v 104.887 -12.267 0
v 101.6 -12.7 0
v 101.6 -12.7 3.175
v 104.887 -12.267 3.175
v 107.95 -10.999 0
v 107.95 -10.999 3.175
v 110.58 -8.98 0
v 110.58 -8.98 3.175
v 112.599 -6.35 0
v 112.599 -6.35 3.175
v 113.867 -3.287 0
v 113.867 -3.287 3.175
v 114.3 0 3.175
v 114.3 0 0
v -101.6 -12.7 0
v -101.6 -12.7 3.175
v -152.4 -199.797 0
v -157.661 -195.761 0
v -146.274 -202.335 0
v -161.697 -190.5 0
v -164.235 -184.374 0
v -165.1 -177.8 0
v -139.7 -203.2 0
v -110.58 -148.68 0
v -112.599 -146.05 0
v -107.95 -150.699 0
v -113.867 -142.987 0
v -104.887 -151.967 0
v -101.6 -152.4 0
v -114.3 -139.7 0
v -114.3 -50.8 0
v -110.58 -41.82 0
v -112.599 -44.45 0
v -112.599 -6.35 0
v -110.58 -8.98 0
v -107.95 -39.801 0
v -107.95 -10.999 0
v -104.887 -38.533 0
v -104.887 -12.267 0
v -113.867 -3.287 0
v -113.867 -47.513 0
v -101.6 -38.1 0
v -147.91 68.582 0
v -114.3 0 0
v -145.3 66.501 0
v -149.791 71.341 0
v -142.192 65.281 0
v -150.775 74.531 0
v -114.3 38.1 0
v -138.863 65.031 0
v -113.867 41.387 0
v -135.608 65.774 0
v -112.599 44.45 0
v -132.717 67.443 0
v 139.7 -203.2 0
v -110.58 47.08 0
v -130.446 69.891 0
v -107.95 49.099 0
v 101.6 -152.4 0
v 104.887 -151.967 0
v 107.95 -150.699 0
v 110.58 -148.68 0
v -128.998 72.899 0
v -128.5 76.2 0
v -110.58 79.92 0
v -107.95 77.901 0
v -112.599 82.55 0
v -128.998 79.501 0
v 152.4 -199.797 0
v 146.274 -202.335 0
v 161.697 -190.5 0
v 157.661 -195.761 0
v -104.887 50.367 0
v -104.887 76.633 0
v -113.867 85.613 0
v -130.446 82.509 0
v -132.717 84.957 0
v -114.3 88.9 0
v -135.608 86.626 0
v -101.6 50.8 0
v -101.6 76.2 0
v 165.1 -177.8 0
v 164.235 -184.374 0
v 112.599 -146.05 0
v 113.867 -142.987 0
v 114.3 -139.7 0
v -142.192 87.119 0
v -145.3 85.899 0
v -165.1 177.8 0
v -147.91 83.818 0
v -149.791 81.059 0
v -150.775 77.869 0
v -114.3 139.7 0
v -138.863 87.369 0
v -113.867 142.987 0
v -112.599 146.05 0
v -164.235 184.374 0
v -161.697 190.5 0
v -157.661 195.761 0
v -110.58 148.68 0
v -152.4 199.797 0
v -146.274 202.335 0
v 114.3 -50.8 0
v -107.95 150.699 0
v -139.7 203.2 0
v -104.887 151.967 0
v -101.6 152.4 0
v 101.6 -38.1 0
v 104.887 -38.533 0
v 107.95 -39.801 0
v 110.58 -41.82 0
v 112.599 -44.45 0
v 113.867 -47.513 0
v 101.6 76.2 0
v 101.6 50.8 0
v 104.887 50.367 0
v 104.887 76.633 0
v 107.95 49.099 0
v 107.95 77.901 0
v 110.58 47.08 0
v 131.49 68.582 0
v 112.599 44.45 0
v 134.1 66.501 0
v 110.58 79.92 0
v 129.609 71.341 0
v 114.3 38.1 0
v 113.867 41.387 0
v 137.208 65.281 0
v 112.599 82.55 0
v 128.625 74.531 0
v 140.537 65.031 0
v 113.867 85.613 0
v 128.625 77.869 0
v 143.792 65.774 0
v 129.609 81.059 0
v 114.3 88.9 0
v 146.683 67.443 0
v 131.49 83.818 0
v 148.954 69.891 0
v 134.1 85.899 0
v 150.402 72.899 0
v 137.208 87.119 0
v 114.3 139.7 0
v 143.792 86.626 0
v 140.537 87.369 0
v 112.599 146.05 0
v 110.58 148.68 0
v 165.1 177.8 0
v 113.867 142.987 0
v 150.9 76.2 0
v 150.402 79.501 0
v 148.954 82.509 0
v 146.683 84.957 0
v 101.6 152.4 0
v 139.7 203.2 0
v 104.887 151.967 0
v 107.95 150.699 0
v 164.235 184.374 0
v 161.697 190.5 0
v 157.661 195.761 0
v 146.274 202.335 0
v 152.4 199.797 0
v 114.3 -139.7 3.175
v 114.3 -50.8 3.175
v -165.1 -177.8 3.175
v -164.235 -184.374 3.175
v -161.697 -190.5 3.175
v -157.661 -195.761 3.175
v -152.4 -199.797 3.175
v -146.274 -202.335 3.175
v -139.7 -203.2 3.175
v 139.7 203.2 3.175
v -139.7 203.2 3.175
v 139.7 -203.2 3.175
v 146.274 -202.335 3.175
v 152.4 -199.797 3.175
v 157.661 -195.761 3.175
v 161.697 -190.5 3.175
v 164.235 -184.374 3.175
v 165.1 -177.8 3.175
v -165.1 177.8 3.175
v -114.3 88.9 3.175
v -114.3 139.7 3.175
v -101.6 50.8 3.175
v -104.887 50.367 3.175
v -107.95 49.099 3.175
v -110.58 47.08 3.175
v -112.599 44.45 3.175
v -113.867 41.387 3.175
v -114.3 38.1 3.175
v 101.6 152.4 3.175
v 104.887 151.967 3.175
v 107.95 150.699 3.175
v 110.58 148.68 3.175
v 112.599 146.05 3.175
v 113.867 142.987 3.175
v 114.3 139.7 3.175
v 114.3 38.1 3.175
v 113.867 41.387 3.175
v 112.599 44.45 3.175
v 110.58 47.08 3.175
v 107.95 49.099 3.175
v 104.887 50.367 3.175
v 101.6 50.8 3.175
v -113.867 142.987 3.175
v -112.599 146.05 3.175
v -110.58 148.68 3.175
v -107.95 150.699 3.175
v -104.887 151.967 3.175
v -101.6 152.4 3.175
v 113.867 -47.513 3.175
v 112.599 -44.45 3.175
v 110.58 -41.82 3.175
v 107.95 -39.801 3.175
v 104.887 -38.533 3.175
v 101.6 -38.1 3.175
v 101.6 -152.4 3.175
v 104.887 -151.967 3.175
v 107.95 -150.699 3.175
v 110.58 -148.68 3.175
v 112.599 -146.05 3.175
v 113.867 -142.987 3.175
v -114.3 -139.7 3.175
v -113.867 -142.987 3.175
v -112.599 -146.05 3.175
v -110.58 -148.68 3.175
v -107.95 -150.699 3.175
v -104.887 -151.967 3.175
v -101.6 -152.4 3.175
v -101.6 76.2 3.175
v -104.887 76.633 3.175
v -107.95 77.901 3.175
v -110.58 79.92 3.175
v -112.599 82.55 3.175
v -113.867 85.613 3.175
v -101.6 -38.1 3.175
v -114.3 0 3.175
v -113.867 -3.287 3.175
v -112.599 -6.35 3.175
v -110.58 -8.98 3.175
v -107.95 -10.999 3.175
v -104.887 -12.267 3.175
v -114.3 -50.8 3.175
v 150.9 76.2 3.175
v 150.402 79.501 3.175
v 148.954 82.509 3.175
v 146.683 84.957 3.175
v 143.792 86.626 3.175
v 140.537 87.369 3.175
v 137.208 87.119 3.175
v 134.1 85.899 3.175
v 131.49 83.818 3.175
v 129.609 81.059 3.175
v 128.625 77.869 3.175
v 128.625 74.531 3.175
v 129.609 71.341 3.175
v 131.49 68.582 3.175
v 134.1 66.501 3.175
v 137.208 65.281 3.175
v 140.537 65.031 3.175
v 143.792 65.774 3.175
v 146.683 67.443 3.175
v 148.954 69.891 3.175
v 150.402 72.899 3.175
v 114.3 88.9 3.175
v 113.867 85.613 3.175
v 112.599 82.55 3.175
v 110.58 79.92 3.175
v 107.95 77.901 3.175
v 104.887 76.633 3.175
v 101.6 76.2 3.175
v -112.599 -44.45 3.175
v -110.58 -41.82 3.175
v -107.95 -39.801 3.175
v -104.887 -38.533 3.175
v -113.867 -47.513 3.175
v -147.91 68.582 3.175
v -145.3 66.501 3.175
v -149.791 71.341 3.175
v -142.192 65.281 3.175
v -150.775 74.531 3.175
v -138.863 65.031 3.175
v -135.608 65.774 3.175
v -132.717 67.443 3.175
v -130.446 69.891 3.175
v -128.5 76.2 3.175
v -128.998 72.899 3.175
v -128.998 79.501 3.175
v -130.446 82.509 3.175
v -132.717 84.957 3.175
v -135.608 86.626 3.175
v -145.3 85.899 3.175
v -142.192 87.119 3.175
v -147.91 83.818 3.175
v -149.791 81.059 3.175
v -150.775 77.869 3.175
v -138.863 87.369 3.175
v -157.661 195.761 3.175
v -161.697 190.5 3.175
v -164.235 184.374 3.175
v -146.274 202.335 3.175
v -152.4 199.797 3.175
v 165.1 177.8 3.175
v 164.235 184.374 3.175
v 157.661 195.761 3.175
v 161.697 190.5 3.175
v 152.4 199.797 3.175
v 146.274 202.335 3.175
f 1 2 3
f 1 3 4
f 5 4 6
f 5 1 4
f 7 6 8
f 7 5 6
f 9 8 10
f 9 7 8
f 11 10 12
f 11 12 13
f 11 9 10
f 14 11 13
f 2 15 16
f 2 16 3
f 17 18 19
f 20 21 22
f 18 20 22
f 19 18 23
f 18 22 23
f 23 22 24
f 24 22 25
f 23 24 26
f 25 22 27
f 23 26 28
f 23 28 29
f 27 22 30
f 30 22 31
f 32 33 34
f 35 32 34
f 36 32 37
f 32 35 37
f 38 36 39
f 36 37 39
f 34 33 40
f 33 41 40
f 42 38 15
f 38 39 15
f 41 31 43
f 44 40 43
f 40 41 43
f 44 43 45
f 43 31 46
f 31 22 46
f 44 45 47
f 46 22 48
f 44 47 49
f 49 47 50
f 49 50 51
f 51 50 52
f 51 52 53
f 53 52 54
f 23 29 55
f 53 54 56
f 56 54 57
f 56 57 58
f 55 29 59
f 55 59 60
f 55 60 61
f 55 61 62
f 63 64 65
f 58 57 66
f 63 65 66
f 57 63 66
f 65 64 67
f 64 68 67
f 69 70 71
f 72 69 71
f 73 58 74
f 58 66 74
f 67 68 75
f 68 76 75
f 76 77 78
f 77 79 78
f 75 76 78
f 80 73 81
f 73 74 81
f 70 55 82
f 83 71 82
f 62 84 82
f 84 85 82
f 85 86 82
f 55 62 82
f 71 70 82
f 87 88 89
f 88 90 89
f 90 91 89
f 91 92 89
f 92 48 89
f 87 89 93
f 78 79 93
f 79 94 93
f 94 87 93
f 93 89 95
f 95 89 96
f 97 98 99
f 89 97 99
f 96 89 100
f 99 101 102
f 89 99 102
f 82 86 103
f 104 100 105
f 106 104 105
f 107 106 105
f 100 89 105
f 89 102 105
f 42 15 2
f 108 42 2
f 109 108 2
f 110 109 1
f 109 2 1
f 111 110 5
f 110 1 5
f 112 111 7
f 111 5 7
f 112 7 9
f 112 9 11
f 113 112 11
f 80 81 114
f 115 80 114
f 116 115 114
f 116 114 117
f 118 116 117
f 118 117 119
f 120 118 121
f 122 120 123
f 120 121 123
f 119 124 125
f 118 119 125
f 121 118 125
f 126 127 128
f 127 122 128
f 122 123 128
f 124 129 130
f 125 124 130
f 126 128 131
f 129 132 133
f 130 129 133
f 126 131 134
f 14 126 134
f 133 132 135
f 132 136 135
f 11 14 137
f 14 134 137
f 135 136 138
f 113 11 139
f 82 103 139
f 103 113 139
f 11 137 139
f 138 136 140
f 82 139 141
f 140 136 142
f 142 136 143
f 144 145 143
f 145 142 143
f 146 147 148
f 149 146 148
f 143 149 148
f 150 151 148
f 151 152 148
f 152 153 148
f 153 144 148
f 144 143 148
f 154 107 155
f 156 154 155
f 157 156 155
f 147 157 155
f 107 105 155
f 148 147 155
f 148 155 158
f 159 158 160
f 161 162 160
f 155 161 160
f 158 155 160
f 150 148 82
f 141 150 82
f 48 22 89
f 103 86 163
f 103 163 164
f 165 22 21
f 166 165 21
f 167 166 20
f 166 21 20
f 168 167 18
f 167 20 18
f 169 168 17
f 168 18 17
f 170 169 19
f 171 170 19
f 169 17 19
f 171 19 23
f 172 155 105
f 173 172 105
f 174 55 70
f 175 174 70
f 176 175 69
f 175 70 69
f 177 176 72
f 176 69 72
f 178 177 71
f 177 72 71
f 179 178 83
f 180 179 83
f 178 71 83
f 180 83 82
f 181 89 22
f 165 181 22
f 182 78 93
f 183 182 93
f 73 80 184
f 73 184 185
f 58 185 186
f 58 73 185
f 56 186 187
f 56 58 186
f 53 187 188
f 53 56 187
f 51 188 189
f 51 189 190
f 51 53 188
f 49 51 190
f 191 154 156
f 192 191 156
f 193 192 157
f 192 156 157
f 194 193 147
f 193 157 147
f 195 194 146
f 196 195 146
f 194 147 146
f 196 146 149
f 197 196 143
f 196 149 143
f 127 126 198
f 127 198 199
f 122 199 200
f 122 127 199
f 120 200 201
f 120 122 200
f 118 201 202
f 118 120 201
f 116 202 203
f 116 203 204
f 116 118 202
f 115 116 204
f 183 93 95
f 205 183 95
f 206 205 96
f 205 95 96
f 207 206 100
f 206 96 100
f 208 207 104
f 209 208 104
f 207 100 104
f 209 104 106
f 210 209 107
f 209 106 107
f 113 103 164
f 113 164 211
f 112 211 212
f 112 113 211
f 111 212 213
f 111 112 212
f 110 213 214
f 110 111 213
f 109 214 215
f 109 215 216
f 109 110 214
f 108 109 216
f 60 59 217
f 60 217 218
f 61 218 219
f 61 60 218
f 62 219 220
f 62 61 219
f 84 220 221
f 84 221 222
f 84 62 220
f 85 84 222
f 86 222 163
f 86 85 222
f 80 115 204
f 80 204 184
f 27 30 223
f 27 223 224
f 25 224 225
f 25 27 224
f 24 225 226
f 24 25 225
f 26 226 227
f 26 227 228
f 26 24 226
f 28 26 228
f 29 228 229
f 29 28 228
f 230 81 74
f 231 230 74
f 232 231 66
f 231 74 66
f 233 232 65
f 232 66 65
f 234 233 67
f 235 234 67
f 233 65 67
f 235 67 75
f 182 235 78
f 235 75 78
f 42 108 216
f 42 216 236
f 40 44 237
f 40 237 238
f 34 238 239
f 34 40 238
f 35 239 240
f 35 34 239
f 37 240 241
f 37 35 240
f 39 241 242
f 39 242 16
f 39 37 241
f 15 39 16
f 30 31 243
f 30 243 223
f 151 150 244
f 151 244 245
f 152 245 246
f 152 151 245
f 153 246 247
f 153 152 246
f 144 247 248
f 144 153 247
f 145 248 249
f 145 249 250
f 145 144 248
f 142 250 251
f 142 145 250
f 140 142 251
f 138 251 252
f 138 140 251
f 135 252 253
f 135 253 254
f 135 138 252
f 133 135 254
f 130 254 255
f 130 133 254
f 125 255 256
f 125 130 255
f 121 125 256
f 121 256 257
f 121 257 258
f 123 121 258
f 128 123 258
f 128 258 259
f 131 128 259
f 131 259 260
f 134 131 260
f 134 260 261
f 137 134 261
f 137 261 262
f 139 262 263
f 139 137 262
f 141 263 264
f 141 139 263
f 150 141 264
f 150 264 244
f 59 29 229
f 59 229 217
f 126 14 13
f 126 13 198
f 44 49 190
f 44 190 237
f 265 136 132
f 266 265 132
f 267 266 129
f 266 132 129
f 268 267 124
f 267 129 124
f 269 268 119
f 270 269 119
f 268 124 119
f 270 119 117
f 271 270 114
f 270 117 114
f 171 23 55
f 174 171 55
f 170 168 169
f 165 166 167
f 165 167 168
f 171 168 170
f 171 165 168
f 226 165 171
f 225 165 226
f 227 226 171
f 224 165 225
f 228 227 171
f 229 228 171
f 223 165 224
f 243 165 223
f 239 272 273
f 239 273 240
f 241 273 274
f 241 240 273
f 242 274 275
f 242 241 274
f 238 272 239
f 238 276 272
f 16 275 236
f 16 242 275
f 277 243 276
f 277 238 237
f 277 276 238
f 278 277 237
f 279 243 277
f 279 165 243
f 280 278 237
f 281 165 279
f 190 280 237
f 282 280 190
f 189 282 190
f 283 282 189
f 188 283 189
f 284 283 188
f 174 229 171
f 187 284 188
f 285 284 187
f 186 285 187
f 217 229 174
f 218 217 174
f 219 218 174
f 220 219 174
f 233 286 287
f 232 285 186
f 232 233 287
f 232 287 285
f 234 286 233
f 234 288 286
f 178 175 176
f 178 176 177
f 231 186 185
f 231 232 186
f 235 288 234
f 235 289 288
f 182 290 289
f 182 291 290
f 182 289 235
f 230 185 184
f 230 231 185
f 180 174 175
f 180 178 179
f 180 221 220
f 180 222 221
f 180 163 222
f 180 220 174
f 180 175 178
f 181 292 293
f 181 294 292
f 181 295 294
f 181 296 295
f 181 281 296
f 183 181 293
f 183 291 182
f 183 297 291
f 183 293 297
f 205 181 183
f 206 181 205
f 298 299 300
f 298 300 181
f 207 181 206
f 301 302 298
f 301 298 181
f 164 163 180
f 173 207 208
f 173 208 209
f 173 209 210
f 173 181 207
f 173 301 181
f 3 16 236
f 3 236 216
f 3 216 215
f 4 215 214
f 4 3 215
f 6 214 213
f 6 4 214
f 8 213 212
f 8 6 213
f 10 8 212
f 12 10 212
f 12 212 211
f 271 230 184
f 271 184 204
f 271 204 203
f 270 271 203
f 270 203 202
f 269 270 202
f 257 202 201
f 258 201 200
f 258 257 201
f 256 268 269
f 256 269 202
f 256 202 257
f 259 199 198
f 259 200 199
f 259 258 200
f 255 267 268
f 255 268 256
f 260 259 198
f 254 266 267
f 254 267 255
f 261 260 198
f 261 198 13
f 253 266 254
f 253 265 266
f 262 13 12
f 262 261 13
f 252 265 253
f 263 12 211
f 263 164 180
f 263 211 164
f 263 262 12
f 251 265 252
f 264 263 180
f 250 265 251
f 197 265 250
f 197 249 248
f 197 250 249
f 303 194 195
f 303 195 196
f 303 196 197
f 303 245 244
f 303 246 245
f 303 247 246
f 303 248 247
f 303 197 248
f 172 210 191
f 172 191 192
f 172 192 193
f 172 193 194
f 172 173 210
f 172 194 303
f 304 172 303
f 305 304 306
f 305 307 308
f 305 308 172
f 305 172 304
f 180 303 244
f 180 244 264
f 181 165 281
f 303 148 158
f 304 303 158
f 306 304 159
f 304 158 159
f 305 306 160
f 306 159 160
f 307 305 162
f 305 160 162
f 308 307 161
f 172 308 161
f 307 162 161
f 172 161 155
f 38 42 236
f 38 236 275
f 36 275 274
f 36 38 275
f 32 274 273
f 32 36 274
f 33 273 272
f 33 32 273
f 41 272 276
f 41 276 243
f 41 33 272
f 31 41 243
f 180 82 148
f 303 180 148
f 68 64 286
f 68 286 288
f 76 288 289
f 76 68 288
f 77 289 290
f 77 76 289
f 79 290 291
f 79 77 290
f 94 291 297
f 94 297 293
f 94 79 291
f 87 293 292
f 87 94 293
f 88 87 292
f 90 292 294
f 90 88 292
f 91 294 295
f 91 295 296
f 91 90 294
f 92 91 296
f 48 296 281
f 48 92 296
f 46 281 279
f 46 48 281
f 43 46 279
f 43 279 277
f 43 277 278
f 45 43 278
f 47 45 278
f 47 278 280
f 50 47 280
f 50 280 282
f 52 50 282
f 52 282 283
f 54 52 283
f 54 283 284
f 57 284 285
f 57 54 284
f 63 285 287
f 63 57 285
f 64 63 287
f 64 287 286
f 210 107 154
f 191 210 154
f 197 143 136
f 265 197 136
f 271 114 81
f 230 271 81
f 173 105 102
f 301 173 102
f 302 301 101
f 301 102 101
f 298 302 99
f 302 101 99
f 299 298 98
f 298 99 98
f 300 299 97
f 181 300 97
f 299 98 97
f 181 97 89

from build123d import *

# Parameters (mm, degrees)
SKETCH1_R           = 11.2
BOSS_EXTRUDE1_DEPTH = 3.175


with BuildPart() as part:
    # Sketch1 → Boss-Extrude1 (new body)
    with BuildSketch(Plane.XY):
        with BuildLine():
            Line((-139.7, -203.2), (139.7, -203.2))
            ThreePointArc((139.7, -203.2), (157.660512242, -195.760512242), (165.1, -177.8))
            Line((165.1, -177.8), (165.1, 177.8))
            ThreePointArc((165.1, 177.8), (157.660512242, 195.760512242), (139.7, 203.2))
            Line((139.7, 203.2), (-139.7, 203.2))
            ThreePointArc((-139.7, 203.2), (-157.660512242, 195.760512242), (-165.1, 177.8))
            Line((-165.1, 177.8), (-165.1, -177.8))
            ThreePointArc((-165.1, -177.8), (-157.660512242, -195.760512242), (-139.7, -203.2))
        make_face()
        with Locations((-139.7, 76.2)):
            Circle(SKETCH1_R, mode=Mode.SUBTRACT)
        with Locations((139.7, 76.2)):
            Circle(SKETCH1_R, mode=Mode.SUBTRACT)
        with BuildLine():
            Line((-101.6, -152.4), (101.6, -152.4))
            ThreePointArc((101.6, -152.4), (110.580256121, -148.680256121), (114.3, -139.7))
            Line((114.3, -139.7), (114.3, -50.8))
            ThreePointArc((114.3, -50.8), (110.580256121, -41.819743879), (101.6, -38.1))
            Line((101.6, -38.1), (-101.6, -38.1))
            ThreePointArc((-101.6, -38.1), (-110.580256121, -41.819743879), (-114.3, -50.8))
            Line((-114.3, -50.8), (-114.3, -139.7))
            ThreePointArc((-114.3, -139.7), (-110.580256121, -148.680256121), (-101.6, -152.4))
        make_face(mode=Mode.SUBTRACT)
        with BuildLine():
            Line((-101.6, -12.7), (101.6, -12.7))
            ThreePointArc((101.6, -12.7), (110.580256121, -8.980256121), (114.3, 0))
            Line((114.3, 0), (114.3, 38.1))
            ThreePointArc((114.3, 38.1), (110.580256121, 47.080256121), (101.6, 50.8))
            Line((101.6, 50.8), (-101.6, 50.8))
            ThreePointArc((-101.6, 50.8), (-110.580256121, 47.080256121), (-114.3, 38.1))
            Line((-114.3, 38.1), (-114.3, 0))
            ThreePointArc((-114.3, 0), (-110.580256121, -8.980256121), (-101.6, -12.7))
        make_face(mode=Mode.SUBTRACT)
        with BuildLine():
            Line((-101.6, 152.4), (101.6, 152.4))
            ThreePointArc((101.6, 152.4), (110.580256121, 148.680256121), (114.3, 139.7))
            Line((114.3, 139.7), (114.3, 88.9))
            ThreePointArc((114.3, 88.9), (110.580256121, 79.919743879), (101.6, 76.2))
            Line((101.6, 76.2), (-101.6, 76.2))
            ThreePointArc((-101.6, 76.2), (-110.580256121, 79.919743879), (-114.3, 88.9))
            Line((-114.3, 88.9), (-114.3, 139.7))
            ThreePointArc((-114.3, 139.7), (-110.580256121, 148.680256121), (-101.6, 152.4))
        make_face(mode=Mode.SUBTRACT)
    extrude(amount=BOSS_EXTRUDE1_DEPTH)


solid = part.part
